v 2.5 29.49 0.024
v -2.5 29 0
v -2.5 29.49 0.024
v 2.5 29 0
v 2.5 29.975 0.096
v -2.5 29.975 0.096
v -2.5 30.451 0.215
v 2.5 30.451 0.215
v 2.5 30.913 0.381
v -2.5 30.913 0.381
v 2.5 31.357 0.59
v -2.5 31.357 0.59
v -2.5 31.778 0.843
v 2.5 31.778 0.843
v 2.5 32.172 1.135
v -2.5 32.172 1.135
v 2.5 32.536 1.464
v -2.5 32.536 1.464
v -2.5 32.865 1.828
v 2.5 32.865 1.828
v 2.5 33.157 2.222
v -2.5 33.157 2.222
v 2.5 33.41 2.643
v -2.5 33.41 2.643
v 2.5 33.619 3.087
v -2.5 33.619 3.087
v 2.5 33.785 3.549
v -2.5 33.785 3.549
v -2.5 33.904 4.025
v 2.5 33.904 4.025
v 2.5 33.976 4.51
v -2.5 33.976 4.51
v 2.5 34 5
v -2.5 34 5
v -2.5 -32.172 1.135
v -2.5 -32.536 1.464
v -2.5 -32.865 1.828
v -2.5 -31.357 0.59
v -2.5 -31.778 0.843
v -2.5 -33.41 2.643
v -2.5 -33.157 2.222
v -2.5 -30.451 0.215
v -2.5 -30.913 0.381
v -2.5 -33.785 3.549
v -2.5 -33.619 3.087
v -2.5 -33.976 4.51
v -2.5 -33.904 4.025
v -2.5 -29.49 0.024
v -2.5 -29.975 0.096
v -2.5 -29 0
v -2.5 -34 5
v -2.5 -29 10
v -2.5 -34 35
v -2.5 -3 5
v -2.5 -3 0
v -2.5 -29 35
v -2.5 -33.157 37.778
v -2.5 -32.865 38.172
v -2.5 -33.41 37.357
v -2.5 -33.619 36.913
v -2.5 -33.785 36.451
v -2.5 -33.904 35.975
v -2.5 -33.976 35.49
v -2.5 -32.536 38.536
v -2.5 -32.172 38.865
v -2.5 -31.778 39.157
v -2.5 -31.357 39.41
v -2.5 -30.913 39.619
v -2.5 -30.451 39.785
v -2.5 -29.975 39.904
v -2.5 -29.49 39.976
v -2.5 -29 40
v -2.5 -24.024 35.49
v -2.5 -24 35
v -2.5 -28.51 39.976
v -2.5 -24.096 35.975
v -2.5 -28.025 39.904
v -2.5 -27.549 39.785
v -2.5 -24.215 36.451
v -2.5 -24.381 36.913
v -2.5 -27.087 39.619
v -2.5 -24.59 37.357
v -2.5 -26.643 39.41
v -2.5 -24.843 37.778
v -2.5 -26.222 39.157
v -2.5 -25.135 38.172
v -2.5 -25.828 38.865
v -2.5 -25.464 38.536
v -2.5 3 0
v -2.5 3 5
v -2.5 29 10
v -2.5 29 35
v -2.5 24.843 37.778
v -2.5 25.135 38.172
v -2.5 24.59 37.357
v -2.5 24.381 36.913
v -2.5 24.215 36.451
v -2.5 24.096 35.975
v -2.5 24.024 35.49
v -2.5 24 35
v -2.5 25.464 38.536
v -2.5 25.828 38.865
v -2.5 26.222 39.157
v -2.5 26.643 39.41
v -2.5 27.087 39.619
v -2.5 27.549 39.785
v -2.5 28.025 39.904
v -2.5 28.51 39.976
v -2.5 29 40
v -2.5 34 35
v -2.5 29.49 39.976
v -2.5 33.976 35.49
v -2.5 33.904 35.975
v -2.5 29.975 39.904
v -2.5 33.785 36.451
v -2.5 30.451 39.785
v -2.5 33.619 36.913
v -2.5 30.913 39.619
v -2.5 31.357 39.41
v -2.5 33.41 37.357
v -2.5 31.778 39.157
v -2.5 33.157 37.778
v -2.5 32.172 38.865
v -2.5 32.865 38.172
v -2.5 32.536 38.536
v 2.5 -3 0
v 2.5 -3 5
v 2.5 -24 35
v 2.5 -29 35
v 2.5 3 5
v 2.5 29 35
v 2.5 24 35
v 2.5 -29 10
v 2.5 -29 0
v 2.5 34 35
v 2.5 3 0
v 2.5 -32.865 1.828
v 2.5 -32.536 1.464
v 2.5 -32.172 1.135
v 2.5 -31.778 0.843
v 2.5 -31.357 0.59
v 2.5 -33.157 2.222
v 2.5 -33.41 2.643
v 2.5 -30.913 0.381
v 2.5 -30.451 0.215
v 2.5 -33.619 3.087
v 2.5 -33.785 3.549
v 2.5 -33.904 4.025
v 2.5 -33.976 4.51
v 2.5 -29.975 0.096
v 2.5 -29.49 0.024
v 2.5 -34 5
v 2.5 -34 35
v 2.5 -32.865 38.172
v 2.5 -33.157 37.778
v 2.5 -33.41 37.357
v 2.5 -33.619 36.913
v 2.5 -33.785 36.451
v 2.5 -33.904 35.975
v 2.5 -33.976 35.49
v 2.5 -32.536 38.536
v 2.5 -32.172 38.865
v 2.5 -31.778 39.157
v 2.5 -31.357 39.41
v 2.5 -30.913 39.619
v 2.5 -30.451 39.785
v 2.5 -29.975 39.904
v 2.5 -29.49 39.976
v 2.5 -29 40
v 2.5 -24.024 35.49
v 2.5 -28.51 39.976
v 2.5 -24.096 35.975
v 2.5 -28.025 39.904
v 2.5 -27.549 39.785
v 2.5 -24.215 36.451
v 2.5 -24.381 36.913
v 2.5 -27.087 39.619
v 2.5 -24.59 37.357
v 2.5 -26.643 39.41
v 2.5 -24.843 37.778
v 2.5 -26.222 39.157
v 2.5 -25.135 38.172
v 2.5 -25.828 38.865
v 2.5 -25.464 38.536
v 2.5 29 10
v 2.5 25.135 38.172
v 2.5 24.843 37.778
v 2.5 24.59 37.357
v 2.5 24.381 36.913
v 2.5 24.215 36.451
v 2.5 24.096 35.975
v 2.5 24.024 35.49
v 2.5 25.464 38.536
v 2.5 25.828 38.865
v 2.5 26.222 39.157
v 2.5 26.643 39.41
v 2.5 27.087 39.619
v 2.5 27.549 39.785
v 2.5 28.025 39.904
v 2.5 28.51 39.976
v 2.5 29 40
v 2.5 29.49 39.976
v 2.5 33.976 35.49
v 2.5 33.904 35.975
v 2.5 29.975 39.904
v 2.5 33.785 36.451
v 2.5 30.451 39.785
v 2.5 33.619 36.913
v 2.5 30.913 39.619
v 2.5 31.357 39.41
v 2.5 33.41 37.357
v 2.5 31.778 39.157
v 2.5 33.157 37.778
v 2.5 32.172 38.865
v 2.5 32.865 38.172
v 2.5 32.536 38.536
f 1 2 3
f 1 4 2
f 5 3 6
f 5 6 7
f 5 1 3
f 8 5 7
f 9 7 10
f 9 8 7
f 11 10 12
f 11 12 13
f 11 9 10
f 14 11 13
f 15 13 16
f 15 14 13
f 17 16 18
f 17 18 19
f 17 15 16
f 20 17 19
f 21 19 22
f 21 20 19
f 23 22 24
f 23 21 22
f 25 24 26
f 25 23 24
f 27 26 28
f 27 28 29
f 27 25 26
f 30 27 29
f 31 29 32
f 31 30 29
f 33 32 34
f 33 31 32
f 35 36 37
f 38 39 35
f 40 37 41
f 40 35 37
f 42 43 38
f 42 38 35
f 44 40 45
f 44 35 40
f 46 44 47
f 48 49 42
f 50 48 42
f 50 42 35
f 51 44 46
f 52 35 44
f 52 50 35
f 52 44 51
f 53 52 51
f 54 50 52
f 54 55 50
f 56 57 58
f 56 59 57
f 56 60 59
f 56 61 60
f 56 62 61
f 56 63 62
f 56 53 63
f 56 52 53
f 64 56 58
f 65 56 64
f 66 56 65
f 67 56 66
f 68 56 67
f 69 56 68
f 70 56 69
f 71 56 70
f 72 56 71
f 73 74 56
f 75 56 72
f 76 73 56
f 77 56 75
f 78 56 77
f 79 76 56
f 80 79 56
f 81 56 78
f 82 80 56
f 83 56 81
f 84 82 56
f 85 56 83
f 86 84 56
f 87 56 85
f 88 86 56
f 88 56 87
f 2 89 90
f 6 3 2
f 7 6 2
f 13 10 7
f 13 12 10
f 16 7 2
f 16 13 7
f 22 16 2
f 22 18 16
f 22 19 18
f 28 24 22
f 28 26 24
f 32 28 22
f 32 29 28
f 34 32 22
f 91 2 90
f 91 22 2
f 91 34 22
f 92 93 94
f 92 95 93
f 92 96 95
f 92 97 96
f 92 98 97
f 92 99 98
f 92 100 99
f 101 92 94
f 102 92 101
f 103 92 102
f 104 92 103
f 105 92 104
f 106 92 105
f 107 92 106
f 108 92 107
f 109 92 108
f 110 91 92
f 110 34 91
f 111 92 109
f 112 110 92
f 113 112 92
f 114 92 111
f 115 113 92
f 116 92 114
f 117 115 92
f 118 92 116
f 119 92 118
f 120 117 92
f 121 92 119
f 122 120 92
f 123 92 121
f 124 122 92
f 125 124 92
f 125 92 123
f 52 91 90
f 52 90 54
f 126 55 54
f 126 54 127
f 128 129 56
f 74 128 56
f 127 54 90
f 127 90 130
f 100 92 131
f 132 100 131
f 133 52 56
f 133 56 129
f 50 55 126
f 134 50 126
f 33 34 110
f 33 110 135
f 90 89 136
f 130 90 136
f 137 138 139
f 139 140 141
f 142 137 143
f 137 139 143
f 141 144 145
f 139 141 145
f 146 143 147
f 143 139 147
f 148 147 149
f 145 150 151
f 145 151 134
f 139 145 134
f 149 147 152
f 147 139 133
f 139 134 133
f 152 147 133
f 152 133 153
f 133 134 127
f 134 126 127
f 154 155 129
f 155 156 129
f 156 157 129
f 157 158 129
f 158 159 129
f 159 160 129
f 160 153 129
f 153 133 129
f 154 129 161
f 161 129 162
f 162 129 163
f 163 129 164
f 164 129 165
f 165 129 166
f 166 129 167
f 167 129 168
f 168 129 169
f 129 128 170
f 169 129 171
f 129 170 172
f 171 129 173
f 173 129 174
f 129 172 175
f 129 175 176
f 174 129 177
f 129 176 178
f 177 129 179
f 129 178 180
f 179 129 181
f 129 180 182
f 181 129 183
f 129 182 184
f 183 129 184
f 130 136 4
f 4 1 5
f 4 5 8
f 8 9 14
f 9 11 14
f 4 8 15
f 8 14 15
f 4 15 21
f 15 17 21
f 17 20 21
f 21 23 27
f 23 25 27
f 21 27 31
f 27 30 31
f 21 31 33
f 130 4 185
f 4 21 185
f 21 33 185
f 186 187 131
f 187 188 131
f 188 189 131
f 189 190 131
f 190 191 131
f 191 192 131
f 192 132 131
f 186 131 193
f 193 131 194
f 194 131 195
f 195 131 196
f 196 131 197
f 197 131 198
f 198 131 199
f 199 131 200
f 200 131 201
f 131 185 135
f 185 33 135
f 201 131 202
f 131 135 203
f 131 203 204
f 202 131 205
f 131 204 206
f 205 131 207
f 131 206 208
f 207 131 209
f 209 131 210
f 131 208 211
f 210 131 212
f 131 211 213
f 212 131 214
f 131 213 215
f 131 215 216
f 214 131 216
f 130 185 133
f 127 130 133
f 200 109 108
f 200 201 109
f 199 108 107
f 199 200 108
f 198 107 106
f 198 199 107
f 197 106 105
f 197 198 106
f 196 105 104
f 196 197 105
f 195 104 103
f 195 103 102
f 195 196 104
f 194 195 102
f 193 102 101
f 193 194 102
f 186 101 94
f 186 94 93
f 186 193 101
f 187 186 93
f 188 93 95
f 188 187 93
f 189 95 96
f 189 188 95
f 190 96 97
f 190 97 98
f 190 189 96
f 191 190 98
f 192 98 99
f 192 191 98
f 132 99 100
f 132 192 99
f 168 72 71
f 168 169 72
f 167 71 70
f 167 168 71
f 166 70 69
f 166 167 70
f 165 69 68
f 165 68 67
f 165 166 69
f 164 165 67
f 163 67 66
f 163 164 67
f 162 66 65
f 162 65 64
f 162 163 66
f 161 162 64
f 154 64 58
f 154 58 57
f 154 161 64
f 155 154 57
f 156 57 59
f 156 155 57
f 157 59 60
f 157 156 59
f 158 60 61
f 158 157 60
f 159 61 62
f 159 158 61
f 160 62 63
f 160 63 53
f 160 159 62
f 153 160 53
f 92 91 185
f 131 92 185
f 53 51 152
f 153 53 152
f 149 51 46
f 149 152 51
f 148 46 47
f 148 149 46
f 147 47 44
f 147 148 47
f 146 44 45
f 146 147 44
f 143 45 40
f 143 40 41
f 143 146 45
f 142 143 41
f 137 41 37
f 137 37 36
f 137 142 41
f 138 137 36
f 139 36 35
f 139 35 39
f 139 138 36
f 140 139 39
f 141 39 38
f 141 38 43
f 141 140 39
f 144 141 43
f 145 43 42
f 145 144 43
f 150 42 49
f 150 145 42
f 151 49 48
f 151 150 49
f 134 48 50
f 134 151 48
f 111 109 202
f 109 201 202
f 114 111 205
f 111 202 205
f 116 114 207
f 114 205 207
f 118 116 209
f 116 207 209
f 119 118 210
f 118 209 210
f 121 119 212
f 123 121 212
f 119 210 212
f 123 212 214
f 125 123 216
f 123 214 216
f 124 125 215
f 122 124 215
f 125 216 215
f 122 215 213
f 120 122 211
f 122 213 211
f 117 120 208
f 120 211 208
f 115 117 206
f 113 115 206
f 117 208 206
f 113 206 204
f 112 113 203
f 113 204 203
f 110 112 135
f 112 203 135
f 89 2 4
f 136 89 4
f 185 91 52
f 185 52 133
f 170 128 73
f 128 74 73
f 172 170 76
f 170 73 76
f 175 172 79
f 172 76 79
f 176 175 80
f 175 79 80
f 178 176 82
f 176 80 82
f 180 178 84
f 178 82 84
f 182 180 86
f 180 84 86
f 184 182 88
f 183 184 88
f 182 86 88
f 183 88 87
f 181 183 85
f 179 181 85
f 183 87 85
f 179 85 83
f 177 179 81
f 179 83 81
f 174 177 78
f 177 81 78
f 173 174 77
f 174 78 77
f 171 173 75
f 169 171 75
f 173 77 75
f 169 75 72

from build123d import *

# Parameters (mm, degrees)
F0_W     = 5
F0_H     = 68
F1_DEPTH = 10
F2_W     = 5
F2_H     = 5
F3_DEPTH = 30
F5_W     = 5
F5_H     = 5
F6_DEPTH = 5
F4_W     = 5
F4_H     = 5
F7_DEPTH = 5
F8_W     = 5
F8_H     = 6
F9_DEPTH = 5
F10_R    = 4.99999
F11_R    = 5


# Not quite as in the source:
# - a fillet or chamfer is up to 0.001 mm smaller than in the source, because OpenCascade refuses the exact size


with BuildPart() as f1:
    # F0 (on Top) → F1 (new body)
    with BuildSketch(Plane.XY):
        Rectangle(F0_W, F0_H)
    extrude(amount=F1_DEPTH)

    # F2 (on face) → F3 (join)
    with BuildSketch(Plane.XY.offset(10)):
        with Locations((0, 31.5)):
            Rectangle(F2_W, F2_H)
        with Locations((0, -31.5)):
            Rectangle(F2_W, F2_H)
    extrude(amount=F3_DEPTH)

    # F5 (on face) → F6 (join)
    with BuildSketch(Plane(origin=(0, -29, 0), x_dir=(-1, 0, 0), z_dir=(0, 1, 0))):
        with Locations((0, 37.5)):
            Rectangle(F5_W, F5_H)
    extrude(amount=F6_DEPTH)

    # F4 (on face) → F7 (join)
    with BuildSketch(Plane.XZ.offset(-29)):
        with Locations((0, 37.5)):
            Rectangle(F4_W, F4_H)
    extrude(amount=F7_DEPTH)

    # F8 (on face) → F9 (cut)
    with BuildSketch(Plane(origin=(0, 0, 0), x_dir=(1, 0, 0), z_dir=(0, 0, -1))):
        Rectangle(F8_W, F8_H)
    extrude(amount=-F9_DEPTH, mode=Mode.SUBTRACT)

    # F10 (radius 5 in the source; OpenCascade refuses exactly that, so slightly less here)
    f10_edges = [f1.edges().sort_by_distance(p)[0] for p in [
        (0, 24, 40),
        (0, -24, 40),
        (0, -34, 40),
    ]]
    fillet(f10_edges, radius=F10_R)

    # F11
    f11_edges = [f1.edges().sort_by_distance(p)[0] for p in [
        (0, 34, 40),
        (0, 34, 0),
        (0, -34, 0),
    ]]
    fillet(f11_edges, radius=F11_R)


solid = f1.part
